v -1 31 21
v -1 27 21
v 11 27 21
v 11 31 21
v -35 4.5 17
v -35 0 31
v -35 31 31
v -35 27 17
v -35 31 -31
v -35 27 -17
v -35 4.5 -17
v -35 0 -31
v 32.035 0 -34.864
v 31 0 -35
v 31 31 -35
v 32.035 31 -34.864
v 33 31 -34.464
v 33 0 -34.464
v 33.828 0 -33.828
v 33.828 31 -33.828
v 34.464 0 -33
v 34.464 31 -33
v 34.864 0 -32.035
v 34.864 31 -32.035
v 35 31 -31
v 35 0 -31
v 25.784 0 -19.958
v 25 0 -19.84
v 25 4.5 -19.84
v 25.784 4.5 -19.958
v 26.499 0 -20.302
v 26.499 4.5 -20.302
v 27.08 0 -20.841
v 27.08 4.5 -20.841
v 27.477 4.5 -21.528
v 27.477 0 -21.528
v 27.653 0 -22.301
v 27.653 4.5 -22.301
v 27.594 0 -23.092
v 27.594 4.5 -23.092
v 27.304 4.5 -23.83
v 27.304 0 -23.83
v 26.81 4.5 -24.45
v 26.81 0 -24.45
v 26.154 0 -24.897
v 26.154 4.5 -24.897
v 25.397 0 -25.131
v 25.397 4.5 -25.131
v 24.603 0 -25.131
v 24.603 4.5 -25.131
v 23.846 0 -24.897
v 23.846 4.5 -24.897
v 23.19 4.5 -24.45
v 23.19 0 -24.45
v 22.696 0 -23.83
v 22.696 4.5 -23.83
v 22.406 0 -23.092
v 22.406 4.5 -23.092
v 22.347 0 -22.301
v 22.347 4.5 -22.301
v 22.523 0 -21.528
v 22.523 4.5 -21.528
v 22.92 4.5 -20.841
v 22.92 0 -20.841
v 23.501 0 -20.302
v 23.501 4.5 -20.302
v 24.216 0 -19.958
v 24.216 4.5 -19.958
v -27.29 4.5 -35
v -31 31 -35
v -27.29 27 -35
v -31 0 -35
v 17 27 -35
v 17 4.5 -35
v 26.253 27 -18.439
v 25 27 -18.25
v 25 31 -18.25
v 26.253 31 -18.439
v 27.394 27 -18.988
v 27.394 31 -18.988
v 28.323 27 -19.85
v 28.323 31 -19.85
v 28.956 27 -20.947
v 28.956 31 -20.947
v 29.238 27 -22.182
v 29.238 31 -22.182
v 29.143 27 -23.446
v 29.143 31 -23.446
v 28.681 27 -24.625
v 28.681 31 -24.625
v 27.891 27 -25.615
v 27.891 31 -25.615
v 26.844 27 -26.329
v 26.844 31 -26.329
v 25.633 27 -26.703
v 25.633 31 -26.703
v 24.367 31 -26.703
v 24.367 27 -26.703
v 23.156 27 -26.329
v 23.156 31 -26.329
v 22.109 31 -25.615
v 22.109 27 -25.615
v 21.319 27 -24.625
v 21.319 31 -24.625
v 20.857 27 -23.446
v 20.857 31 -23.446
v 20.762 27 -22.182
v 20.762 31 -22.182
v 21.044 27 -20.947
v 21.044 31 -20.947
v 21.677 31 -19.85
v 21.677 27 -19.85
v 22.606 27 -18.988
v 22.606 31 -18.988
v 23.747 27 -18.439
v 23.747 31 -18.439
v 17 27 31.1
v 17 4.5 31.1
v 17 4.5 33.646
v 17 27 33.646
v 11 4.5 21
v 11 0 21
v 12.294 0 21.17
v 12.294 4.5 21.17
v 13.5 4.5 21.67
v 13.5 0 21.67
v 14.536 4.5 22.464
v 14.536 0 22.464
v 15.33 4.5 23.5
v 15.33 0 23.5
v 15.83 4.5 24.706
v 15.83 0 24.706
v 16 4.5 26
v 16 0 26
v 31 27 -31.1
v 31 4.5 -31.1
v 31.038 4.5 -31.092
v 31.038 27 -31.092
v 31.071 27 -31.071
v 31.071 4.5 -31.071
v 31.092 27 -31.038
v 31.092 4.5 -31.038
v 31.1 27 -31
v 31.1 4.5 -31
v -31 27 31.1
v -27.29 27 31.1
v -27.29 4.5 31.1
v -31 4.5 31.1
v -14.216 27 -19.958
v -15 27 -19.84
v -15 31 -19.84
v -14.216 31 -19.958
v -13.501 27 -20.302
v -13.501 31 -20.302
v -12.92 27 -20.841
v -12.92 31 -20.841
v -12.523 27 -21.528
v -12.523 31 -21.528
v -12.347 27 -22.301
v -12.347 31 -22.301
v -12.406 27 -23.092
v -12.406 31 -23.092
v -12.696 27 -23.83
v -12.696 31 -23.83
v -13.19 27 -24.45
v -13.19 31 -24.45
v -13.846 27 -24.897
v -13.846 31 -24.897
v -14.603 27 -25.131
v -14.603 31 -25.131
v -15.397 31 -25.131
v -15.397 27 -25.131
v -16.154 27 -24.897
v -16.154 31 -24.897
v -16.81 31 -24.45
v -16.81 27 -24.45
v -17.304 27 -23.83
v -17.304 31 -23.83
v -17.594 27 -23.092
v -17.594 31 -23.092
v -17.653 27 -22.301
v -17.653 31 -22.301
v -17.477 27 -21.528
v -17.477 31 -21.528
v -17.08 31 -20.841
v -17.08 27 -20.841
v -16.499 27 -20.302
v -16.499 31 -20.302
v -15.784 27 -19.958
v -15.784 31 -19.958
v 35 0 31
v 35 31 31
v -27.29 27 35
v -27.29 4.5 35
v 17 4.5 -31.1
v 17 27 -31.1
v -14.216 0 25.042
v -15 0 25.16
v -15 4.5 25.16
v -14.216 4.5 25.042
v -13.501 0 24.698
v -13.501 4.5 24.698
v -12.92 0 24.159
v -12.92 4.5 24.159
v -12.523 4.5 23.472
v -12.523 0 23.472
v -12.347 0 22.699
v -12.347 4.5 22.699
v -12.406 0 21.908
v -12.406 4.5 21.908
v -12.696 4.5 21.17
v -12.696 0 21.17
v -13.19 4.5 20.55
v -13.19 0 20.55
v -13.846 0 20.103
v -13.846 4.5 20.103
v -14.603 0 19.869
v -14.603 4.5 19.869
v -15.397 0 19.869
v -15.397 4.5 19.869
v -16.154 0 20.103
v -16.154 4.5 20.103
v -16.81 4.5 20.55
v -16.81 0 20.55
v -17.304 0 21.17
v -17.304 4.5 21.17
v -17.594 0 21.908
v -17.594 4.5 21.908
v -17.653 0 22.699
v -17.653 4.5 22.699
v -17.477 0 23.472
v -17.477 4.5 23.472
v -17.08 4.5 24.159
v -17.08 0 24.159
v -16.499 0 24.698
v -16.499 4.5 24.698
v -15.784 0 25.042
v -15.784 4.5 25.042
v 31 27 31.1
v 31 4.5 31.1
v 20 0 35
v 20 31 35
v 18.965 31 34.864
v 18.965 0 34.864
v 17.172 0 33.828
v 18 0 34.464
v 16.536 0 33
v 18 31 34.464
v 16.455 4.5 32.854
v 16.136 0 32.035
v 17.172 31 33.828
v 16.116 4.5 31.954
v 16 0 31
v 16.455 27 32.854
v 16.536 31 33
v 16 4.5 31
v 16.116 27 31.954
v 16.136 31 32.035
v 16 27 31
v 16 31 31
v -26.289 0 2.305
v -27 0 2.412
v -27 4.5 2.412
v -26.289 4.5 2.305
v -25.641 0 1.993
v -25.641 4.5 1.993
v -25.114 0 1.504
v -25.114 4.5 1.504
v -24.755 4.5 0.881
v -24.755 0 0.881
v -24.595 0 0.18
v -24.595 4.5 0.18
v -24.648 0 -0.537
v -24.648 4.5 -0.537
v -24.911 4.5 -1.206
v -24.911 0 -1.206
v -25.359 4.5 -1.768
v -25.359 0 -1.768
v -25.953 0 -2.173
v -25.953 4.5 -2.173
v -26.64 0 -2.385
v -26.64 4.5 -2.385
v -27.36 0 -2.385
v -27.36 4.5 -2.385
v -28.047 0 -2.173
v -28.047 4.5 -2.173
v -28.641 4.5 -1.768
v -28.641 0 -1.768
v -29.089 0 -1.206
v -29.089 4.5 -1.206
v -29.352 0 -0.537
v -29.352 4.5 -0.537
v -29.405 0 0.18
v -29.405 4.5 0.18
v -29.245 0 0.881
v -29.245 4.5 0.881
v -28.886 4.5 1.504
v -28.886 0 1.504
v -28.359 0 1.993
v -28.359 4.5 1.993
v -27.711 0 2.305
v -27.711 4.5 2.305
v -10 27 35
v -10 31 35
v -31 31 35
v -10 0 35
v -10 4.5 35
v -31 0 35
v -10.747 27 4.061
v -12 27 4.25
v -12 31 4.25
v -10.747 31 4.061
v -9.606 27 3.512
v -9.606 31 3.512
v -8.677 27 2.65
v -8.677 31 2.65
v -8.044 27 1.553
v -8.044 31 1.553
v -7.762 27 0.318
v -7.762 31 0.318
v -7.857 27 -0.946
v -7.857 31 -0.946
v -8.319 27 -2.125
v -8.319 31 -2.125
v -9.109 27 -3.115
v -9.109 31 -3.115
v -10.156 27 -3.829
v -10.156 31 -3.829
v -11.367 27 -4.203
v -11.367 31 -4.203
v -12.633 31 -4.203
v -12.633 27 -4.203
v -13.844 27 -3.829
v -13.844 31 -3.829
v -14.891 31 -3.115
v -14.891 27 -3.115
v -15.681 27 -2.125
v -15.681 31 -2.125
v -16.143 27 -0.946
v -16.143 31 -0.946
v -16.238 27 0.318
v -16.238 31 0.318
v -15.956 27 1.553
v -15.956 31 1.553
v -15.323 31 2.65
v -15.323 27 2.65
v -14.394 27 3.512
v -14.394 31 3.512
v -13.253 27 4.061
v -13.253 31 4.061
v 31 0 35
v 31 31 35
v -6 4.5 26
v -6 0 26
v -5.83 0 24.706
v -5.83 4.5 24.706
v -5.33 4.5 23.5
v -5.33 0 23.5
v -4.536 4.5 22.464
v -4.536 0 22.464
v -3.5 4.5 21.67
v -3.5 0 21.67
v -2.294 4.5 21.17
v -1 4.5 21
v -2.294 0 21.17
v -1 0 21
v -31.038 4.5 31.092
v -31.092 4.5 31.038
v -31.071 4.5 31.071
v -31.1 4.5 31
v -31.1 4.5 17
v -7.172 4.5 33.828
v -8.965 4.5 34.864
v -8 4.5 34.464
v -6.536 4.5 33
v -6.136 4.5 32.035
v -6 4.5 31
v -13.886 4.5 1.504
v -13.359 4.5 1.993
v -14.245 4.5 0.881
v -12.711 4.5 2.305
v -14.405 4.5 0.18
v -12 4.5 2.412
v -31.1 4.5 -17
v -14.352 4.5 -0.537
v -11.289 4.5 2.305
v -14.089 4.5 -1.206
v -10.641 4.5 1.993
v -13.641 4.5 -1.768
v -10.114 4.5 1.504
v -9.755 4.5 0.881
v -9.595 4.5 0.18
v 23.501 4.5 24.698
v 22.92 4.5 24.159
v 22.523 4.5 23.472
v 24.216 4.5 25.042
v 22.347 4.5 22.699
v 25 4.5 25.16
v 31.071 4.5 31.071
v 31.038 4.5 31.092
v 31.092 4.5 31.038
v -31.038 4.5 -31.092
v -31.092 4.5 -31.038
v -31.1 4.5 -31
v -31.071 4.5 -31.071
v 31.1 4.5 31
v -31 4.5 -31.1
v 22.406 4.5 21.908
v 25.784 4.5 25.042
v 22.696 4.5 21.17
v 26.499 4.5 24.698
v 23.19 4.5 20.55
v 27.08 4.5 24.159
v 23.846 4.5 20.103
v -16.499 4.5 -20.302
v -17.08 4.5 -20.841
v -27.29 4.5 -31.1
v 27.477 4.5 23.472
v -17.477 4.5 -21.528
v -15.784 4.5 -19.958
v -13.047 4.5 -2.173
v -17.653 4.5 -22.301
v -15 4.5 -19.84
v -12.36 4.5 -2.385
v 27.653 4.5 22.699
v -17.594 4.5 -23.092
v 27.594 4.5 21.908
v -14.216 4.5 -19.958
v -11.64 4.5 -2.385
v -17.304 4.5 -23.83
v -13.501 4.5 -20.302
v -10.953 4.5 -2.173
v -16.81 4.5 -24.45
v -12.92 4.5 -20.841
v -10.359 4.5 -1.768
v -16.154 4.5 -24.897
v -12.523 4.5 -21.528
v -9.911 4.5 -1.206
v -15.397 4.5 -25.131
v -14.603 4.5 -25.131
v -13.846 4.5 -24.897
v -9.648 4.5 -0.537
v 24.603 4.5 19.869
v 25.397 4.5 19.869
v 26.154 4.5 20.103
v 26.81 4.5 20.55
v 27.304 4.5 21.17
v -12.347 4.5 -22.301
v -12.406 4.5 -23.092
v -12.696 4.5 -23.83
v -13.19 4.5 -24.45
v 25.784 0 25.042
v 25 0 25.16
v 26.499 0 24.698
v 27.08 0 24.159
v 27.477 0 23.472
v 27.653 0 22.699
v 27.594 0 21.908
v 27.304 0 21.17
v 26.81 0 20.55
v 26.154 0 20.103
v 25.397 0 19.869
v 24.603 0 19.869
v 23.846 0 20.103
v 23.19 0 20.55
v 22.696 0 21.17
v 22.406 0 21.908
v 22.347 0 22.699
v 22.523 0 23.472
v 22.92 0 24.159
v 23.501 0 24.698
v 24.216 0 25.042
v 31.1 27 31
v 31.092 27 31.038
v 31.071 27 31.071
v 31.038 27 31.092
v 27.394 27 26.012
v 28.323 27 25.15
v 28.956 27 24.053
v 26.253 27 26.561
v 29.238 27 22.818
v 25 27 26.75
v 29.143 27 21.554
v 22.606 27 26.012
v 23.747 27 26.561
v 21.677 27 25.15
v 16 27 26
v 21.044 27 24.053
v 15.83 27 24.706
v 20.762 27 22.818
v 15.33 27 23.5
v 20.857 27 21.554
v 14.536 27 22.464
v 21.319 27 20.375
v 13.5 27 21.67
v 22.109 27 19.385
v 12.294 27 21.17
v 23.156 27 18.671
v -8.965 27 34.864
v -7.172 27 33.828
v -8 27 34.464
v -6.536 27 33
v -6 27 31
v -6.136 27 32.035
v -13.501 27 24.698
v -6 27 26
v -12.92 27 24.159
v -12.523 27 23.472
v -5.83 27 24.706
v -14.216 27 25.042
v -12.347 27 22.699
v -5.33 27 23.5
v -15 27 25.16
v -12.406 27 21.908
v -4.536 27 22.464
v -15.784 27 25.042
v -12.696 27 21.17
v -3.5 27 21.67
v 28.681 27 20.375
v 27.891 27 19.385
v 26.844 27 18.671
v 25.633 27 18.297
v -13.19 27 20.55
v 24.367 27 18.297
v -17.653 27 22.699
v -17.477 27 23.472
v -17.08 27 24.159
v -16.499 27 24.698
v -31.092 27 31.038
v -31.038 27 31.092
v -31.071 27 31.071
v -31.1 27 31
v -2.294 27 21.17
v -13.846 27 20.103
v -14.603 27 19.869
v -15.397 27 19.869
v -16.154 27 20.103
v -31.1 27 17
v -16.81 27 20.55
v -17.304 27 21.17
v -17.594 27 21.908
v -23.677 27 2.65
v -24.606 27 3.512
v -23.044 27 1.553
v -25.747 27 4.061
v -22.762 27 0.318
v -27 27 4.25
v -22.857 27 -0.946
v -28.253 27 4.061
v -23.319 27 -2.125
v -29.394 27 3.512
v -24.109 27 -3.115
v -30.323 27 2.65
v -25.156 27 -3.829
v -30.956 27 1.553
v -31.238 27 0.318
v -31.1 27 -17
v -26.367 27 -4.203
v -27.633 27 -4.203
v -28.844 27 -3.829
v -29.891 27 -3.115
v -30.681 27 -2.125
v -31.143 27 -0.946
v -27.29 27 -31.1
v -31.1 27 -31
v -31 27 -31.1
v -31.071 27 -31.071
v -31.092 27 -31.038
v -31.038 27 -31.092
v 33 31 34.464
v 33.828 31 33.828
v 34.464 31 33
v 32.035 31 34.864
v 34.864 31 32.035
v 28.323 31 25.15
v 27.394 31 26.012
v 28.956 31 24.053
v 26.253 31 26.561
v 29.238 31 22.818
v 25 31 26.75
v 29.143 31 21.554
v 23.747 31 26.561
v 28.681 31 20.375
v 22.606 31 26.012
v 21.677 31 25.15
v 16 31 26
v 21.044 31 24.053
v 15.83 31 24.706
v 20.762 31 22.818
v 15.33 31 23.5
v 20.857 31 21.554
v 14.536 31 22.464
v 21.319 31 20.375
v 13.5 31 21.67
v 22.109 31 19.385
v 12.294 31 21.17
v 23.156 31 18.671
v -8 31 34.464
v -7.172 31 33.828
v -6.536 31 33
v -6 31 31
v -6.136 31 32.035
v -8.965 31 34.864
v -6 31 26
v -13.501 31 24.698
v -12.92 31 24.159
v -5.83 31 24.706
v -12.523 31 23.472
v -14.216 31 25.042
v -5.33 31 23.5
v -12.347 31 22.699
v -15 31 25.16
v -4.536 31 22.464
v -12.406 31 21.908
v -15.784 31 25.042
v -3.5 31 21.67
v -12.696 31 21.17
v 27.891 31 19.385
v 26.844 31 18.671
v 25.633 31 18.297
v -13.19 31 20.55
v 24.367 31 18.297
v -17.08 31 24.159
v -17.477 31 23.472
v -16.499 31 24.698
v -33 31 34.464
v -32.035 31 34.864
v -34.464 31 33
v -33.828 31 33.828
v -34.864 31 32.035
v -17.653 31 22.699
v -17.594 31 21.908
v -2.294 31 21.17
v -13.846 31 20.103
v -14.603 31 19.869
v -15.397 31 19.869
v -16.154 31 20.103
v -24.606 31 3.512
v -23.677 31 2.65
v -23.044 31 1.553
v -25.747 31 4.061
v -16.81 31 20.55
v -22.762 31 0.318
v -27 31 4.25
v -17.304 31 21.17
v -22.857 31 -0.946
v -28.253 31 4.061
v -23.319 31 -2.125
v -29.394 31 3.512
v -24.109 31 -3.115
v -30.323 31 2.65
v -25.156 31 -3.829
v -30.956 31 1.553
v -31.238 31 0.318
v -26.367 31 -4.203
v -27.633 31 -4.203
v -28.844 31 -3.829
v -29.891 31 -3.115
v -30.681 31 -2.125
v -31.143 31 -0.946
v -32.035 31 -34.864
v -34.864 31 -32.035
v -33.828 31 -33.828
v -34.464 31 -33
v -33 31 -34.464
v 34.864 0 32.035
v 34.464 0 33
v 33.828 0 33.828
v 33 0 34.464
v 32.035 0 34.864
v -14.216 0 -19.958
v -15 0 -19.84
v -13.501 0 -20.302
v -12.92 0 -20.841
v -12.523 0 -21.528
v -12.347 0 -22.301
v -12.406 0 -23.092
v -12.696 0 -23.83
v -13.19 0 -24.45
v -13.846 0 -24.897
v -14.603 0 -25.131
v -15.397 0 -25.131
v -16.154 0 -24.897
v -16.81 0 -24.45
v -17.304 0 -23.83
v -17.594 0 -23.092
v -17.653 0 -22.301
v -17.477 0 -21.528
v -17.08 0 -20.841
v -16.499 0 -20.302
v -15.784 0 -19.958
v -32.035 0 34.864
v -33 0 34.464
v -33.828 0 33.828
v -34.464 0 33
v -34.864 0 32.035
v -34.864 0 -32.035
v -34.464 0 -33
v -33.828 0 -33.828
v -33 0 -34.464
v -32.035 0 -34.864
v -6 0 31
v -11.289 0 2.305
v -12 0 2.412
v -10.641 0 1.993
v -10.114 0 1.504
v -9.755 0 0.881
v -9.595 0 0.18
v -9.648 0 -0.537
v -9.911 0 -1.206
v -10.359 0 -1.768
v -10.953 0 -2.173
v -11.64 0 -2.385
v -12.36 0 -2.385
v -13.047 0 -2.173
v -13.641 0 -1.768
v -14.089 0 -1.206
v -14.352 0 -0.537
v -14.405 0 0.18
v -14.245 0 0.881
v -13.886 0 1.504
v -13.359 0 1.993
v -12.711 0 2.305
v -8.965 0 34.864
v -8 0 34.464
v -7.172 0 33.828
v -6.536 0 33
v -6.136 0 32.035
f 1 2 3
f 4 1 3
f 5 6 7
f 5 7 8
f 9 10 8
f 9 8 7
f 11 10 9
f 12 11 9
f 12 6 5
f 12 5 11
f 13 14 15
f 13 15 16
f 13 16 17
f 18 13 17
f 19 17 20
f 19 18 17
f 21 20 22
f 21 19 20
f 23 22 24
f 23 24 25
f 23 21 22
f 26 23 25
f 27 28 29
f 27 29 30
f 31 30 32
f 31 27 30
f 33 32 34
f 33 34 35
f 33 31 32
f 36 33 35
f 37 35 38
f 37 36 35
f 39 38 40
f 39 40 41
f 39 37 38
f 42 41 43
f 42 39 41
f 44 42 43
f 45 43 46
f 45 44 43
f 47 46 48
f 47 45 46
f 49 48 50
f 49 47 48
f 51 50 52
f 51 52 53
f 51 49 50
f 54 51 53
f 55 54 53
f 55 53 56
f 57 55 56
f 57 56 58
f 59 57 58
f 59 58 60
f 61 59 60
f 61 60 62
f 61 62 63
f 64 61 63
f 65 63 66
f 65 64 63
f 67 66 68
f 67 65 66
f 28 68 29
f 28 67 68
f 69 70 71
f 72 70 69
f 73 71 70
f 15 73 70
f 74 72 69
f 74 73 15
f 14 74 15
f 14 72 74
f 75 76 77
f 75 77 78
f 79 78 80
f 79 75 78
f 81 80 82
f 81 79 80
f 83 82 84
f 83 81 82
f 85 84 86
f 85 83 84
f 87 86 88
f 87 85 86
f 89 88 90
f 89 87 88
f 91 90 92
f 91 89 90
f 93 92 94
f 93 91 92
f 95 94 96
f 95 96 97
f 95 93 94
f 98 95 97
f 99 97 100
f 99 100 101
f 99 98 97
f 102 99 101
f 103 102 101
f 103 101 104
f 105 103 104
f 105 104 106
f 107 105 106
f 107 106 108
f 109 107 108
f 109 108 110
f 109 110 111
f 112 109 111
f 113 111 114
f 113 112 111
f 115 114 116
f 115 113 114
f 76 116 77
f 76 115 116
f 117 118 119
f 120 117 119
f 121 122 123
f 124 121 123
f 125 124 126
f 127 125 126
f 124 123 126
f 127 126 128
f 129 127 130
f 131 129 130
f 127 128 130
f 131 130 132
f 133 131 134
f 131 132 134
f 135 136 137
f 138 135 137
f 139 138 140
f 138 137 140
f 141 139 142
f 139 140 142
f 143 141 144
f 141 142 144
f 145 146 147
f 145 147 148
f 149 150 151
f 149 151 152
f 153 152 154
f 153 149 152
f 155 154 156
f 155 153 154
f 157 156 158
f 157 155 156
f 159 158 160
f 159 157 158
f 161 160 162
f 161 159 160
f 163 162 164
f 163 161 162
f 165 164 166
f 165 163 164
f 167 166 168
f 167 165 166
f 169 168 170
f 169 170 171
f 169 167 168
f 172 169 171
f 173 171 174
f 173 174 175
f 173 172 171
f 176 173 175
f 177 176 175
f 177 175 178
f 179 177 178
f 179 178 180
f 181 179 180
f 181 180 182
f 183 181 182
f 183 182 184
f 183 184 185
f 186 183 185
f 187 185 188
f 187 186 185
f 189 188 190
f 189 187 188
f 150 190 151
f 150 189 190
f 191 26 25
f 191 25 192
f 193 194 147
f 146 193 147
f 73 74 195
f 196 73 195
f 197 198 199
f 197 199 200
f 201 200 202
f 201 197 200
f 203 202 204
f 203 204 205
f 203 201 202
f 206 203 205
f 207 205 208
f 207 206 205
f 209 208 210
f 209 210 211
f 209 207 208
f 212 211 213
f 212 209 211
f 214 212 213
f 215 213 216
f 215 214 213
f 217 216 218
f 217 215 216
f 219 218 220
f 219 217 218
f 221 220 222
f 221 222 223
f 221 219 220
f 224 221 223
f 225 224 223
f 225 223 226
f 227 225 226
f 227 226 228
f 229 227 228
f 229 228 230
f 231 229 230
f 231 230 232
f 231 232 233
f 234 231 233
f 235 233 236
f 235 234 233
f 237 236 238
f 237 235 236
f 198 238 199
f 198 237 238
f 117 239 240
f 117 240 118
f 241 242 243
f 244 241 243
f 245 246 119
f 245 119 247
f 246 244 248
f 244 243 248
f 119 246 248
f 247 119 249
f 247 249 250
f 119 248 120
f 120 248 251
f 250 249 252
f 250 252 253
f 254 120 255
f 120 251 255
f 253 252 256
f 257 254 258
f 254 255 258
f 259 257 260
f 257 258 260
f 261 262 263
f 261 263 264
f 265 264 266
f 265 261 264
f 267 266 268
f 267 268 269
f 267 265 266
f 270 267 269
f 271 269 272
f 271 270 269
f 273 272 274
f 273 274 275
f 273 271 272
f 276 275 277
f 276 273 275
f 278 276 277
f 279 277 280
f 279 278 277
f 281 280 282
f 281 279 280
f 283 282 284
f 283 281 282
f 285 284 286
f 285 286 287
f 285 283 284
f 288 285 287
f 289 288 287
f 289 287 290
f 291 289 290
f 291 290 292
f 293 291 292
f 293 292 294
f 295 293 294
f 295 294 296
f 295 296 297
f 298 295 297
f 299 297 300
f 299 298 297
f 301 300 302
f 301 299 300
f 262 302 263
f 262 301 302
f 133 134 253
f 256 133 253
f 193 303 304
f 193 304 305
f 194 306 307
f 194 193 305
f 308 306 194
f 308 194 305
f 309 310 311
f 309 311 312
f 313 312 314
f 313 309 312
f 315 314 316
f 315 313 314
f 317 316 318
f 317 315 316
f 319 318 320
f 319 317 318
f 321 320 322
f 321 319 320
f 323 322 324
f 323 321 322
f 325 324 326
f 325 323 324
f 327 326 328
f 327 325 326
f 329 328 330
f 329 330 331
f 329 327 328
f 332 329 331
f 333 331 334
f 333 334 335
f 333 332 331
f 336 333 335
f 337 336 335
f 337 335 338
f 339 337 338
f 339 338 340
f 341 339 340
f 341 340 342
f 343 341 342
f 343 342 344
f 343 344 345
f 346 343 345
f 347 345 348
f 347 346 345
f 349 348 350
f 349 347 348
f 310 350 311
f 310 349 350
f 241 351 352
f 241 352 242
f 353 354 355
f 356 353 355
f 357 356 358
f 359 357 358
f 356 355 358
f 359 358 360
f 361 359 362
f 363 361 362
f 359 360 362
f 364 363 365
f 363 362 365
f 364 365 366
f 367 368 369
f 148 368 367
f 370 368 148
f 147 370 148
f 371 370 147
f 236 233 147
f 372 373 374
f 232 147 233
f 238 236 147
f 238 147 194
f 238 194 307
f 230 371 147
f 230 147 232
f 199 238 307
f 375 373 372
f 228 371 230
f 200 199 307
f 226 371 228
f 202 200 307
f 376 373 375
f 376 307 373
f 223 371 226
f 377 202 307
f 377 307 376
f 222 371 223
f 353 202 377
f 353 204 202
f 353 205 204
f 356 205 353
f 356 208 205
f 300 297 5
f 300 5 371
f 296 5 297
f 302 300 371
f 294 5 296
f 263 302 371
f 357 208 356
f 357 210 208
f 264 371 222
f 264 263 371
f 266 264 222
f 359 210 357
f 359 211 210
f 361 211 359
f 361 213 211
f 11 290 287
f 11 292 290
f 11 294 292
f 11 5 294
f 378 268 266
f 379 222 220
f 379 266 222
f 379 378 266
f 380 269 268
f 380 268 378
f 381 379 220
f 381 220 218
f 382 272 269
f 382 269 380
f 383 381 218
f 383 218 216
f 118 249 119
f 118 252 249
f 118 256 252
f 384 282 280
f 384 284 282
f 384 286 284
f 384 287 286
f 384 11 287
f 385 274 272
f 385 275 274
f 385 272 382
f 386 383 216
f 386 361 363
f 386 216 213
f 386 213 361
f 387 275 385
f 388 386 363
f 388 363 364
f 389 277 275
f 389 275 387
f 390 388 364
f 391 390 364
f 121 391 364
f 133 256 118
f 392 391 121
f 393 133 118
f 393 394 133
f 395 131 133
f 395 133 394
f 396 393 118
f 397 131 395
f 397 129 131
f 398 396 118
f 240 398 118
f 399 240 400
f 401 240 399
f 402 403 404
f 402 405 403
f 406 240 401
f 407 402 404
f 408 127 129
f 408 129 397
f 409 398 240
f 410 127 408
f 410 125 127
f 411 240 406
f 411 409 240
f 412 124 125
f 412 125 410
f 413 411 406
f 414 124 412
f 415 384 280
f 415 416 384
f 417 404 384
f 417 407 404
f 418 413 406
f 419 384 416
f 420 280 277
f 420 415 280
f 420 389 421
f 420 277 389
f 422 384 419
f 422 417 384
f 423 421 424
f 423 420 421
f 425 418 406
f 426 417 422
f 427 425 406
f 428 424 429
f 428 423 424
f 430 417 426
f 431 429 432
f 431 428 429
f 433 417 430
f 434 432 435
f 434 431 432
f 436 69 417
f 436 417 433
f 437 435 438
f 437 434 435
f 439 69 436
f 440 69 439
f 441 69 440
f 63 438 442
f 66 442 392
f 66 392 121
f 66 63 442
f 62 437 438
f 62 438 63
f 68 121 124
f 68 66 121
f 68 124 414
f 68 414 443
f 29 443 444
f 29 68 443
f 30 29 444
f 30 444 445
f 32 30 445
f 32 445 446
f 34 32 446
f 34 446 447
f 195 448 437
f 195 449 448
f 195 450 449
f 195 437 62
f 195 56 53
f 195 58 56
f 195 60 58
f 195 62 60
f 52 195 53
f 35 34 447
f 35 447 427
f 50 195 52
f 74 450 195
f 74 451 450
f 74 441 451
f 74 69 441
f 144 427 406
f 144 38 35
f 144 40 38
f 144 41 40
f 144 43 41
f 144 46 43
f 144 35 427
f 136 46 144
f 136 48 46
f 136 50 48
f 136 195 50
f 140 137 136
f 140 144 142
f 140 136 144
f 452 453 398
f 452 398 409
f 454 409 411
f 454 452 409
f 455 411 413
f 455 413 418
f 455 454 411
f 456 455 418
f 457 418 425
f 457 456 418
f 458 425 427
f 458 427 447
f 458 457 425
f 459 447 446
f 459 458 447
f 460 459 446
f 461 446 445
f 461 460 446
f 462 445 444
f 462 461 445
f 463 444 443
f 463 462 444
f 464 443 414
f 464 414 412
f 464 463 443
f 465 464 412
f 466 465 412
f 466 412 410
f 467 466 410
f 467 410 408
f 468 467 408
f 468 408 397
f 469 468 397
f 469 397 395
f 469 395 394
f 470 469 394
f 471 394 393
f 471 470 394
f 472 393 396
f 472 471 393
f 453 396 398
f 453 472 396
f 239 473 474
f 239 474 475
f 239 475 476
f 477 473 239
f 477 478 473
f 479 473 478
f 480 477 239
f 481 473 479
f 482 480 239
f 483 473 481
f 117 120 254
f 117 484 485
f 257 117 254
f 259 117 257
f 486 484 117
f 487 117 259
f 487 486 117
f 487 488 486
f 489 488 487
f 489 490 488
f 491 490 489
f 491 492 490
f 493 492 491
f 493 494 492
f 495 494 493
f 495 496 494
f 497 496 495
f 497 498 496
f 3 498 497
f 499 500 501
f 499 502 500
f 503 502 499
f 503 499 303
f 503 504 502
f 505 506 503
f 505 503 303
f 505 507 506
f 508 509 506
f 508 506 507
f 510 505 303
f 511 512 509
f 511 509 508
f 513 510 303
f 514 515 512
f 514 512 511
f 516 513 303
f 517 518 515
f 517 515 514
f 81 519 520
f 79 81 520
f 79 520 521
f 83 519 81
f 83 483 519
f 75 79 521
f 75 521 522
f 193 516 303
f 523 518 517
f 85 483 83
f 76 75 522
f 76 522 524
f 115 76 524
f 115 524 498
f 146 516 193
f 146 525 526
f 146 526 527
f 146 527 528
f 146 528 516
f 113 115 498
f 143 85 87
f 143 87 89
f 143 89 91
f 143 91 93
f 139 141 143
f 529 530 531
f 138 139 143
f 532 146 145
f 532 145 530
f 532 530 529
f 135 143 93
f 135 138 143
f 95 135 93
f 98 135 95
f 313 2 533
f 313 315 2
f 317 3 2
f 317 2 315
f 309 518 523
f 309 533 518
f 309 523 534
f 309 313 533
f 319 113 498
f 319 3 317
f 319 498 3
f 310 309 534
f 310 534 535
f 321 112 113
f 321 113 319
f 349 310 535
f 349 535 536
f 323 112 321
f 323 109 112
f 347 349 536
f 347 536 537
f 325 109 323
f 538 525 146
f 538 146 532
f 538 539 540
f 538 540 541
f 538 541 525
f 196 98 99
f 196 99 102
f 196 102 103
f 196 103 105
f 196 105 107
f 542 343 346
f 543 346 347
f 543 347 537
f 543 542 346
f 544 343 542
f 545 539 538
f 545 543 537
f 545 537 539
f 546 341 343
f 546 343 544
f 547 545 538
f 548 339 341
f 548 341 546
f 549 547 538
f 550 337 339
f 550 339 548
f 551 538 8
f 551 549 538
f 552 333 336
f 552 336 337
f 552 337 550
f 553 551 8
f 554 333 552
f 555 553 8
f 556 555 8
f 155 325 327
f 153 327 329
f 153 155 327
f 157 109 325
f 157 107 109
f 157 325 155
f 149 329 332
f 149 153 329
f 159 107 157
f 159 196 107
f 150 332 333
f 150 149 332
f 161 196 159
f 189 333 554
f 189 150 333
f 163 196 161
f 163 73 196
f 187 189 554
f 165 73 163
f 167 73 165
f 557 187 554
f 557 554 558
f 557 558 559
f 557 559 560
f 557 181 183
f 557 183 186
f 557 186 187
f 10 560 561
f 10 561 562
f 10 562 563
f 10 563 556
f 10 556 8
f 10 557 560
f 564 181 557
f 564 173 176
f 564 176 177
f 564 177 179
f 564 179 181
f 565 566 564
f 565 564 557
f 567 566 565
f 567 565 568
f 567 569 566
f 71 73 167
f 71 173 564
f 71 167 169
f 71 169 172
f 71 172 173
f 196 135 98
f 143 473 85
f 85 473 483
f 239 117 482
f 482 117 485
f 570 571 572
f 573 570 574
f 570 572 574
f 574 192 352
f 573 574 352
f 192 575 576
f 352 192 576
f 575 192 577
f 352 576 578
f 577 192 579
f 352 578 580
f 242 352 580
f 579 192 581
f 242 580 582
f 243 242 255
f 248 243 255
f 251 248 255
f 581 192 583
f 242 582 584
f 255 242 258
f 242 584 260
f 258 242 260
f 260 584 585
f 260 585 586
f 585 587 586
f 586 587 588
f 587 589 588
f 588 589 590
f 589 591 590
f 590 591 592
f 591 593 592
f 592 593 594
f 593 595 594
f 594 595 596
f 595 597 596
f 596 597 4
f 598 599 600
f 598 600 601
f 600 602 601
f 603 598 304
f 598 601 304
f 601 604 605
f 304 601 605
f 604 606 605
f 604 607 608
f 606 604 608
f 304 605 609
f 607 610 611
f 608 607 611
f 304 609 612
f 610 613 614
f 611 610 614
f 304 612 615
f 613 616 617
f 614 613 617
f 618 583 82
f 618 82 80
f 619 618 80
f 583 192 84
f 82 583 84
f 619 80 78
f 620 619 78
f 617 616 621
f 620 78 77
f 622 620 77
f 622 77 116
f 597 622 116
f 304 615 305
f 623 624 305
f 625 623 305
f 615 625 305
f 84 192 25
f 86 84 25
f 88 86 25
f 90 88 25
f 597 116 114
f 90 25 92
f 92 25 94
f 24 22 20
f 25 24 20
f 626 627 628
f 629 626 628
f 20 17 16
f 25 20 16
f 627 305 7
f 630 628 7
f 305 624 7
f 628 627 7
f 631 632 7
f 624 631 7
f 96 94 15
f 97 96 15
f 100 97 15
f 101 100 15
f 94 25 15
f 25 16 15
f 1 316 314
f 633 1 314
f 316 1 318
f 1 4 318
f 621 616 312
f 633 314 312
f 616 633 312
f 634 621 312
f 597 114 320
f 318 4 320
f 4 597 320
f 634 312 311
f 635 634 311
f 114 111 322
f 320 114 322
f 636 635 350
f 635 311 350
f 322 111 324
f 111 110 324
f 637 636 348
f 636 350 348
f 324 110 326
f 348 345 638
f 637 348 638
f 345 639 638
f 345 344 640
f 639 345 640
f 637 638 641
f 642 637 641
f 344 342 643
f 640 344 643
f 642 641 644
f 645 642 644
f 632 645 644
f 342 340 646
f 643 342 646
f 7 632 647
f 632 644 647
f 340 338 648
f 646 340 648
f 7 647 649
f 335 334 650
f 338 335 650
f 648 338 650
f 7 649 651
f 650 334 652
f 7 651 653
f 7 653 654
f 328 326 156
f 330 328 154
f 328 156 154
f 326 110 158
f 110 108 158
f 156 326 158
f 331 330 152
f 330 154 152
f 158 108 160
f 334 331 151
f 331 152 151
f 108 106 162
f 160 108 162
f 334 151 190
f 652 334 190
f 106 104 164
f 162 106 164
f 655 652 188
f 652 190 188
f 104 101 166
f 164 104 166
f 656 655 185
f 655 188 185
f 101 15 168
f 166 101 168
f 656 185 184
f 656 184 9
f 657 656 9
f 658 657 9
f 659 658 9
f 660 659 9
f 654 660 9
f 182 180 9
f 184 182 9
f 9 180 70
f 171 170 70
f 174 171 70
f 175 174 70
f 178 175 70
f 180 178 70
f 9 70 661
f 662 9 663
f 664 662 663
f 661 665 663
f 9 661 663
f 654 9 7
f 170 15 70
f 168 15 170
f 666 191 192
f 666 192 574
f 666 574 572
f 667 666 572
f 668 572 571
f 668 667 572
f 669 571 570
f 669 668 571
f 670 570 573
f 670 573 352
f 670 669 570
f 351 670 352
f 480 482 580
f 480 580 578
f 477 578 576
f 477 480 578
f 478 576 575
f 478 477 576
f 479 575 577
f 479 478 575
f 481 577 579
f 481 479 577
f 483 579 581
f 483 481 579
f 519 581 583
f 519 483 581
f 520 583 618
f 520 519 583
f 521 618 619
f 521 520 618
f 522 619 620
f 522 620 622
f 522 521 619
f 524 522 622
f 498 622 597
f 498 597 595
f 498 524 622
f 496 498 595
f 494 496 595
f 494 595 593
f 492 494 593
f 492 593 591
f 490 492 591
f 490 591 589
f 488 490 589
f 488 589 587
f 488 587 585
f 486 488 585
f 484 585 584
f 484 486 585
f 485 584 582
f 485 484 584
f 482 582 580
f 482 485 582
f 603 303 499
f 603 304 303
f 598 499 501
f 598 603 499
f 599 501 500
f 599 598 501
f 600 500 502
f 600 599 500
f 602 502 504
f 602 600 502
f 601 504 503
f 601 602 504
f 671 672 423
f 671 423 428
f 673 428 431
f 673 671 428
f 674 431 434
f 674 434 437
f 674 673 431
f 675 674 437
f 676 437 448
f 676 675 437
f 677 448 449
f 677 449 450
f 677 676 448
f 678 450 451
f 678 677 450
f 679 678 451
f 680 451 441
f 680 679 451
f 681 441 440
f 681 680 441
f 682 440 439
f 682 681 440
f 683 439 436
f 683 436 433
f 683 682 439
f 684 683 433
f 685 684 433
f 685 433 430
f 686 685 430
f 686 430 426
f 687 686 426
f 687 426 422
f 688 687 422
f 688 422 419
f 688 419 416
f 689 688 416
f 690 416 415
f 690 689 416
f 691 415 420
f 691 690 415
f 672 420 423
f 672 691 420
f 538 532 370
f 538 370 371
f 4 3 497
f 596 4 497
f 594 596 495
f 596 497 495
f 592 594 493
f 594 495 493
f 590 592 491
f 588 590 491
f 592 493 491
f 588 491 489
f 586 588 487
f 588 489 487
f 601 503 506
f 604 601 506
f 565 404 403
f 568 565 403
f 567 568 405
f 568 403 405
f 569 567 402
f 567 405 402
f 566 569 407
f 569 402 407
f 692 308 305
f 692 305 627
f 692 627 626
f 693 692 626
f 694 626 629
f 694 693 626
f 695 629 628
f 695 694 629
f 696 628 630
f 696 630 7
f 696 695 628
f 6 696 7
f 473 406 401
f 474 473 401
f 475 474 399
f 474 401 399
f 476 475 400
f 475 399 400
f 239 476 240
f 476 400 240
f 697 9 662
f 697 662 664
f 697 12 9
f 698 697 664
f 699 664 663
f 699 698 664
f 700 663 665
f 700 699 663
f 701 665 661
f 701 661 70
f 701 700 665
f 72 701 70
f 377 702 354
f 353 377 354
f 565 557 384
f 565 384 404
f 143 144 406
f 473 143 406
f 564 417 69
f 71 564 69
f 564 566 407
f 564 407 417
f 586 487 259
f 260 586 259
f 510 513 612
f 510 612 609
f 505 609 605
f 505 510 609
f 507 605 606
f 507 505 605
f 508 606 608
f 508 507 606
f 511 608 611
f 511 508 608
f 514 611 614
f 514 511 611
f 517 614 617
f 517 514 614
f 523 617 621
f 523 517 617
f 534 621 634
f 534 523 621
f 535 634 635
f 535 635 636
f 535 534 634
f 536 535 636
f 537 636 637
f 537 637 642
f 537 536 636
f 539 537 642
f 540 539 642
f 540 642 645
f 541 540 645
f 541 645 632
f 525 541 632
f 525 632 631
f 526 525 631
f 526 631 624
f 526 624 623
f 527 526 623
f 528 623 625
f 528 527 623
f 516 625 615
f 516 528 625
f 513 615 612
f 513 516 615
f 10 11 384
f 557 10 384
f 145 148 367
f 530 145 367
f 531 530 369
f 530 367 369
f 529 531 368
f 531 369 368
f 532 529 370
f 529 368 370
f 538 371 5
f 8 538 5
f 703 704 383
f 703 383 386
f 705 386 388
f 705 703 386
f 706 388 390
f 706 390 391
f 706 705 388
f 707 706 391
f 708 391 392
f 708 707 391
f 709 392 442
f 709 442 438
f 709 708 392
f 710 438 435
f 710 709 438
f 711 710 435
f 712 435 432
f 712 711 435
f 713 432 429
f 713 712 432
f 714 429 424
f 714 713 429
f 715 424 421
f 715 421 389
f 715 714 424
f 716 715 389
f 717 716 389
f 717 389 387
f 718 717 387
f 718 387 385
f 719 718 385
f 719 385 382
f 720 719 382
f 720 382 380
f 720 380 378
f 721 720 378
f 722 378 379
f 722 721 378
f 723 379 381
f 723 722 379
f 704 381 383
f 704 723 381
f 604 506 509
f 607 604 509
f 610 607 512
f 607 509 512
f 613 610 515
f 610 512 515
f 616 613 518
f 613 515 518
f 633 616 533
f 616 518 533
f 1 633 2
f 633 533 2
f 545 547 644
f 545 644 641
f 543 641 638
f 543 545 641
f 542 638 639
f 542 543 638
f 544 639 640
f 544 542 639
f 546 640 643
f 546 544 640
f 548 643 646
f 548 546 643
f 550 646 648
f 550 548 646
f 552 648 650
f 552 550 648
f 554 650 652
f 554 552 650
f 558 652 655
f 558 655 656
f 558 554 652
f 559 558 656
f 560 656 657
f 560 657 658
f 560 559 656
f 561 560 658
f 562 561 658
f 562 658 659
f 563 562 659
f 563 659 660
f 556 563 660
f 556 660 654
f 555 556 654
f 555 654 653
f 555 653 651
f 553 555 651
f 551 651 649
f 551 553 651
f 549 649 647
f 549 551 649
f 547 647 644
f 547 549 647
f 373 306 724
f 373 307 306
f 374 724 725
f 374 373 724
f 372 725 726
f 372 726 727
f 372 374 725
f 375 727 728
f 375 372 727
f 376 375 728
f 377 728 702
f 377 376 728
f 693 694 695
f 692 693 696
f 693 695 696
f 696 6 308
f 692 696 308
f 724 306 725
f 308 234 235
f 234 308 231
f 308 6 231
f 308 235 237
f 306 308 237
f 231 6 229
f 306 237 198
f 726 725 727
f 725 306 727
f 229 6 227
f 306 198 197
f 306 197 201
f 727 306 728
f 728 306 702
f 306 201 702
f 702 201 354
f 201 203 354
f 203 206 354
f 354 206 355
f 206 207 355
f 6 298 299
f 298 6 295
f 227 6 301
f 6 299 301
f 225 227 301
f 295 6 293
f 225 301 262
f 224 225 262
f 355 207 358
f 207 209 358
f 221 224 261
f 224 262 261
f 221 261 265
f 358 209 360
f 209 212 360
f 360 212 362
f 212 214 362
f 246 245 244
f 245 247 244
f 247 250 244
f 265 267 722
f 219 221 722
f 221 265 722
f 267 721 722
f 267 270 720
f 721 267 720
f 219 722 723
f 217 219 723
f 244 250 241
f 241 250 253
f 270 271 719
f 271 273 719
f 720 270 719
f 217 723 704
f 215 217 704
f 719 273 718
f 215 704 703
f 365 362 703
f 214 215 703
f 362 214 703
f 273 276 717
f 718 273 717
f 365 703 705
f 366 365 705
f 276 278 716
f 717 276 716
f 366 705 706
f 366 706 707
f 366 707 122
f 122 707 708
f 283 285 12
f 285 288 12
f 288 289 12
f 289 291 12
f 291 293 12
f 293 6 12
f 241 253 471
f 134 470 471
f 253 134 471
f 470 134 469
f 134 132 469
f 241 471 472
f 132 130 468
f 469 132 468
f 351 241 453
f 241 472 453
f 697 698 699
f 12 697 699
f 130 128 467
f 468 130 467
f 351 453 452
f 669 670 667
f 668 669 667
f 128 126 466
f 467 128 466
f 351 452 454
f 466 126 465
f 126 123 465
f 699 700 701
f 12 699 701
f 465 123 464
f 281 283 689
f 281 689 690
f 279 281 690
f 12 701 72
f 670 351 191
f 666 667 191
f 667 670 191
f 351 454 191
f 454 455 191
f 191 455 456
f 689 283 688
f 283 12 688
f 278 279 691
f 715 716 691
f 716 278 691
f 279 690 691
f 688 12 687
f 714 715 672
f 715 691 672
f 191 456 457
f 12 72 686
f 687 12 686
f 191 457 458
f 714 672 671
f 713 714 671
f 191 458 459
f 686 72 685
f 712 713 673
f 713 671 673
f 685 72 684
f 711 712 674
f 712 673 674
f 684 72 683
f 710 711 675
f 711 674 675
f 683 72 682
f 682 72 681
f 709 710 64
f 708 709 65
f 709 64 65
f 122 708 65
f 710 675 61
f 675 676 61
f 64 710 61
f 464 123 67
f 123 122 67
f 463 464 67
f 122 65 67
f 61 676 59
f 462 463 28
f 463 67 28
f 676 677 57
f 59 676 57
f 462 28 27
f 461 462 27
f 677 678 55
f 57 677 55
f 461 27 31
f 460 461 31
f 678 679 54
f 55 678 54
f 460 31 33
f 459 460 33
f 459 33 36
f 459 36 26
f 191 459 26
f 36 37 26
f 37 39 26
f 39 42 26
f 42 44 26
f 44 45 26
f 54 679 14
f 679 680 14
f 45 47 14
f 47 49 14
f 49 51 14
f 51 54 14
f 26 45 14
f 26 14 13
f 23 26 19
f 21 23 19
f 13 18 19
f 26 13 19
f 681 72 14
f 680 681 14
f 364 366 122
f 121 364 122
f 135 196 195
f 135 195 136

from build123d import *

# Parameters (mm, degrees)
SKETCH1_R           = 2.6605
SKETCH1_R_2         = 2.41215
BOSS_EXTRUDE1_DEPTH = 4.5
BOSS_EXTRUDE2_DEPTH = 22.5
SKETCH3_R           = 2.6605
SKETCH3_R_2         = 4.25
BOSS_EXTRUDE3_DEPTH = 4
CUT_EXTRUDE2_DEPTH  = 59.403767002
FILLET1_R           = 4


with BuildPart() as part:
    # Sketch1 → Boss-Extrude1 (new body)
    with BuildSketch(Plane(origin=(0, 0, 0), x_dir=(1, 0, 0), z_dir=(0, 1, 0))):
        with BuildLine():
            Line((-31, -35), (31, -35))
            ThreePointArc((31, -35), (33.828427125, -33.828427125), (35, -31))
            Line((35, -31), (35, 31))
            ThreePointArc((35, 31), (33.828427125, 33.828427125), (31, 35))
            Line((31, 35), (-31, 35))
            ThreePointArc((-31, 35), (-33.828427125, 33.828427125), (-35, 31))
            Line((-35, 31), (-35, -31))
            ThreePointArc((-35, -31), (-33.828427125, -33.828427125), (-31, -35))
        make_face()
        with Locations(Location((25, 22.5, 0), (0, 0, 270))):
            Circle(SKETCH1_R, mode=Mode.SUBTRACT)
        with Locations(Location((25, -22.5, 0), (0, 0, 270))):
            Circle(SKETCH1_R, mode=Mode.SUBTRACT)
        with Locations(Location((-15, -22.5, 0), (0, 0, 270))):
            Circle(SKETCH1_R, mode=Mode.SUBTRACT)
        with Locations(Location((-15, 22.5, 0), (0, 0, 270))):
            Circle(SKETCH1_R, mode=Mode.SUBTRACT)
        with Locations(Location((-12, 0, 0), (0, 0, 270))):
            Circle(SKETCH1_R_2, mode=Mode.SUBTRACT)
        with Locations(Location((-27, 0, 0), (0, 0, 270))):
            Circle(SKETCH1_R_2, mode=Mode.SUBTRACT)
    extrude(amount=BOSS_EXTRUDE1_DEPTH)

    # Sketch2 → Boss-Extrude2 (add)
    with BuildSketch(Plane(origin=(0, 4.5, 0), x_dir=(1, 0, 0), z_dir=(0, 1, 0))):
        with BuildLine():
            Line((-27.289833197, 35), (-31, 35))
            ThreePointArc((-31, 35), (-33.828427125, 33.828427125), (-35, 31))
            Line((-35, 31), (-35, 17))
            Line((-35, 17), (-31.1, 17))
            Line((-31.1, 17), (-31.1, 31))
            ThreePointArc((-31.1, 31), (-31.070710678, 31.070710678), (-31, 31.1))
            Line((-31, 31.1), (-27.289833197, 31.1))
            Line((-27.289833197, 31.1), (-27.289833197, 35))
        make_face()
        with BuildLine():
            Line((-31, -35), (-27.289833197, -35))
            Line((-27.289833197, -35), (-27.289833197, -31.1))
            Line((-27.289833197, -31.1), (-31, -31.1))
            ThreePointArc((-31, -31.1), (-31.070710678, -31.070710678), (-31.1, -31))
            Line((-31.1, -31), (-31.1, -17))
            Line((-31.1, -17), (-35, -17))
            Line((-35, -17), (-35, -31))
            ThreePointArc((-35, -31), (-33.828427125, -33.828427125), (-31, -35))
        make_face()
        with BuildLine():
            Line((17, -35), (31, -35))
            ThreePointArc((31, -35), (33.828427125, -33.828427125), (35, -31))
            Line((35, -31), (35, 31))
            ThreePointArc((35, 31), (33.828427125, 33.828427125), (31, 35))
            Line((31, 35), (17, 35))
            Line((17, 35), (17, 31.1))
            Line((17, 31.1), (31, 31.1))
            ThreePointArc((31, 31.1), (31.070710678, 31.070710678), (31.1, 31))
            Line((31.1, 31), (31.1, -31))
            ThreePointArc((31.1, -31), (31.070710678, -31.070710678), (31, -31.1))
            Line((31, -31.1), (17, -31.1))
            Line((17, -31.1), (17, -35))
        make_face()
    extrude(amount=BOSS_EXTRUDE2_DEPTH)

    # Sketch3 → Boss-Extrude3 (add)
    with BuildSketch(Plane(origin=(0, 27, 0), x_dir=(1, 0, 0), z_dir=(0, 1, 0))):
        with BuildLine():
            Line((-31, 35), (31, 35))
            ThreePointArc((31, 35), (33.828427125, 33.828427125), (35, 31))
            Line((35, 31), (35, -31))
            ThreePointArc((35, -31), (33.828427125, -33.828427125), (31, -35))
            Line((31, -35), (-31, -35))
            ThreePointArc((-31, -35), (-33.828427125, -33.828427125), (-35, -31))
            Line((-35, -31), (-35, 31))
            ThreePointArc((-35, 31), (-33.828427125, 33.828427125), (-31, 35))
        make_face()
        with Locations(Location((-15, 22.5, 0), (0, 0, 270))):
            Circle(SKETCH3_R, mode=Mode.SUBTRACT)
        with Locations(Location((25, 22.5, 0), (0, 0, 270))):
            Circle(SKETCH3_R_2, mode=Mode.SUBTRACT)
        with Locations(Location((25, -22.5, 0), (0, 0, 270))):
            Circle(SKETCH3_R_2, mode=Mode.SUBTRACT)
        with Locations(Location((-15, -22.5, 0), (0, 0, 270))):
            Circle(SKETCH3_R, mode=Mode.SUBTRACT)
        with Locations(Location((-12, 0, 0), (0, 0, 270))):
            Circle(SKETCH3_R_2, mode=Mode.SUBTRACT)
        with Locations(Location((-27, 0, 0), (0, 0, 270))):
            Circle(SKETCH3_R_2, mode=Mode.SUBTRACT)
    extrude(amount=BOSS_EXTRUDE3_DEPTH)

    # Sketch4 → Cut-Extrude2 (cut, through all)
    with BuildSketch(Plane(origin=(0, 0, 0), x_dir=(1, 0, 0), z_dir=(0, 1, 0))):
        with BuildLine():
            Line((-1, -21), (11, -21))
            ThreePointArc((11, -21), (14.535533906, -22.464466094), (16, -26))
            Line((16, -26), (16, -35))
            Line((16, -35), (-6, -35))
            Line((-6, -35), (-6, -26))
            ThreePointArc((-6, -26), (-4.535533906, -22.464466094), (-1, -21))
        make_face()
    extrude(amount=CUT_EXTRUDE2_DEPTH, mode=Mode.SUBTRACT)

    # Fillet1
    fillet1_edges = [part.edges().sort_by_distance(p)[0] for p in [
        (16, 2.25, 35),
        (-6, 2.25, 35),
        (-6, 29, 35),
    ]]
    fillet(fillet1_edges, radius=FILLET1_R)


solid = part.part
